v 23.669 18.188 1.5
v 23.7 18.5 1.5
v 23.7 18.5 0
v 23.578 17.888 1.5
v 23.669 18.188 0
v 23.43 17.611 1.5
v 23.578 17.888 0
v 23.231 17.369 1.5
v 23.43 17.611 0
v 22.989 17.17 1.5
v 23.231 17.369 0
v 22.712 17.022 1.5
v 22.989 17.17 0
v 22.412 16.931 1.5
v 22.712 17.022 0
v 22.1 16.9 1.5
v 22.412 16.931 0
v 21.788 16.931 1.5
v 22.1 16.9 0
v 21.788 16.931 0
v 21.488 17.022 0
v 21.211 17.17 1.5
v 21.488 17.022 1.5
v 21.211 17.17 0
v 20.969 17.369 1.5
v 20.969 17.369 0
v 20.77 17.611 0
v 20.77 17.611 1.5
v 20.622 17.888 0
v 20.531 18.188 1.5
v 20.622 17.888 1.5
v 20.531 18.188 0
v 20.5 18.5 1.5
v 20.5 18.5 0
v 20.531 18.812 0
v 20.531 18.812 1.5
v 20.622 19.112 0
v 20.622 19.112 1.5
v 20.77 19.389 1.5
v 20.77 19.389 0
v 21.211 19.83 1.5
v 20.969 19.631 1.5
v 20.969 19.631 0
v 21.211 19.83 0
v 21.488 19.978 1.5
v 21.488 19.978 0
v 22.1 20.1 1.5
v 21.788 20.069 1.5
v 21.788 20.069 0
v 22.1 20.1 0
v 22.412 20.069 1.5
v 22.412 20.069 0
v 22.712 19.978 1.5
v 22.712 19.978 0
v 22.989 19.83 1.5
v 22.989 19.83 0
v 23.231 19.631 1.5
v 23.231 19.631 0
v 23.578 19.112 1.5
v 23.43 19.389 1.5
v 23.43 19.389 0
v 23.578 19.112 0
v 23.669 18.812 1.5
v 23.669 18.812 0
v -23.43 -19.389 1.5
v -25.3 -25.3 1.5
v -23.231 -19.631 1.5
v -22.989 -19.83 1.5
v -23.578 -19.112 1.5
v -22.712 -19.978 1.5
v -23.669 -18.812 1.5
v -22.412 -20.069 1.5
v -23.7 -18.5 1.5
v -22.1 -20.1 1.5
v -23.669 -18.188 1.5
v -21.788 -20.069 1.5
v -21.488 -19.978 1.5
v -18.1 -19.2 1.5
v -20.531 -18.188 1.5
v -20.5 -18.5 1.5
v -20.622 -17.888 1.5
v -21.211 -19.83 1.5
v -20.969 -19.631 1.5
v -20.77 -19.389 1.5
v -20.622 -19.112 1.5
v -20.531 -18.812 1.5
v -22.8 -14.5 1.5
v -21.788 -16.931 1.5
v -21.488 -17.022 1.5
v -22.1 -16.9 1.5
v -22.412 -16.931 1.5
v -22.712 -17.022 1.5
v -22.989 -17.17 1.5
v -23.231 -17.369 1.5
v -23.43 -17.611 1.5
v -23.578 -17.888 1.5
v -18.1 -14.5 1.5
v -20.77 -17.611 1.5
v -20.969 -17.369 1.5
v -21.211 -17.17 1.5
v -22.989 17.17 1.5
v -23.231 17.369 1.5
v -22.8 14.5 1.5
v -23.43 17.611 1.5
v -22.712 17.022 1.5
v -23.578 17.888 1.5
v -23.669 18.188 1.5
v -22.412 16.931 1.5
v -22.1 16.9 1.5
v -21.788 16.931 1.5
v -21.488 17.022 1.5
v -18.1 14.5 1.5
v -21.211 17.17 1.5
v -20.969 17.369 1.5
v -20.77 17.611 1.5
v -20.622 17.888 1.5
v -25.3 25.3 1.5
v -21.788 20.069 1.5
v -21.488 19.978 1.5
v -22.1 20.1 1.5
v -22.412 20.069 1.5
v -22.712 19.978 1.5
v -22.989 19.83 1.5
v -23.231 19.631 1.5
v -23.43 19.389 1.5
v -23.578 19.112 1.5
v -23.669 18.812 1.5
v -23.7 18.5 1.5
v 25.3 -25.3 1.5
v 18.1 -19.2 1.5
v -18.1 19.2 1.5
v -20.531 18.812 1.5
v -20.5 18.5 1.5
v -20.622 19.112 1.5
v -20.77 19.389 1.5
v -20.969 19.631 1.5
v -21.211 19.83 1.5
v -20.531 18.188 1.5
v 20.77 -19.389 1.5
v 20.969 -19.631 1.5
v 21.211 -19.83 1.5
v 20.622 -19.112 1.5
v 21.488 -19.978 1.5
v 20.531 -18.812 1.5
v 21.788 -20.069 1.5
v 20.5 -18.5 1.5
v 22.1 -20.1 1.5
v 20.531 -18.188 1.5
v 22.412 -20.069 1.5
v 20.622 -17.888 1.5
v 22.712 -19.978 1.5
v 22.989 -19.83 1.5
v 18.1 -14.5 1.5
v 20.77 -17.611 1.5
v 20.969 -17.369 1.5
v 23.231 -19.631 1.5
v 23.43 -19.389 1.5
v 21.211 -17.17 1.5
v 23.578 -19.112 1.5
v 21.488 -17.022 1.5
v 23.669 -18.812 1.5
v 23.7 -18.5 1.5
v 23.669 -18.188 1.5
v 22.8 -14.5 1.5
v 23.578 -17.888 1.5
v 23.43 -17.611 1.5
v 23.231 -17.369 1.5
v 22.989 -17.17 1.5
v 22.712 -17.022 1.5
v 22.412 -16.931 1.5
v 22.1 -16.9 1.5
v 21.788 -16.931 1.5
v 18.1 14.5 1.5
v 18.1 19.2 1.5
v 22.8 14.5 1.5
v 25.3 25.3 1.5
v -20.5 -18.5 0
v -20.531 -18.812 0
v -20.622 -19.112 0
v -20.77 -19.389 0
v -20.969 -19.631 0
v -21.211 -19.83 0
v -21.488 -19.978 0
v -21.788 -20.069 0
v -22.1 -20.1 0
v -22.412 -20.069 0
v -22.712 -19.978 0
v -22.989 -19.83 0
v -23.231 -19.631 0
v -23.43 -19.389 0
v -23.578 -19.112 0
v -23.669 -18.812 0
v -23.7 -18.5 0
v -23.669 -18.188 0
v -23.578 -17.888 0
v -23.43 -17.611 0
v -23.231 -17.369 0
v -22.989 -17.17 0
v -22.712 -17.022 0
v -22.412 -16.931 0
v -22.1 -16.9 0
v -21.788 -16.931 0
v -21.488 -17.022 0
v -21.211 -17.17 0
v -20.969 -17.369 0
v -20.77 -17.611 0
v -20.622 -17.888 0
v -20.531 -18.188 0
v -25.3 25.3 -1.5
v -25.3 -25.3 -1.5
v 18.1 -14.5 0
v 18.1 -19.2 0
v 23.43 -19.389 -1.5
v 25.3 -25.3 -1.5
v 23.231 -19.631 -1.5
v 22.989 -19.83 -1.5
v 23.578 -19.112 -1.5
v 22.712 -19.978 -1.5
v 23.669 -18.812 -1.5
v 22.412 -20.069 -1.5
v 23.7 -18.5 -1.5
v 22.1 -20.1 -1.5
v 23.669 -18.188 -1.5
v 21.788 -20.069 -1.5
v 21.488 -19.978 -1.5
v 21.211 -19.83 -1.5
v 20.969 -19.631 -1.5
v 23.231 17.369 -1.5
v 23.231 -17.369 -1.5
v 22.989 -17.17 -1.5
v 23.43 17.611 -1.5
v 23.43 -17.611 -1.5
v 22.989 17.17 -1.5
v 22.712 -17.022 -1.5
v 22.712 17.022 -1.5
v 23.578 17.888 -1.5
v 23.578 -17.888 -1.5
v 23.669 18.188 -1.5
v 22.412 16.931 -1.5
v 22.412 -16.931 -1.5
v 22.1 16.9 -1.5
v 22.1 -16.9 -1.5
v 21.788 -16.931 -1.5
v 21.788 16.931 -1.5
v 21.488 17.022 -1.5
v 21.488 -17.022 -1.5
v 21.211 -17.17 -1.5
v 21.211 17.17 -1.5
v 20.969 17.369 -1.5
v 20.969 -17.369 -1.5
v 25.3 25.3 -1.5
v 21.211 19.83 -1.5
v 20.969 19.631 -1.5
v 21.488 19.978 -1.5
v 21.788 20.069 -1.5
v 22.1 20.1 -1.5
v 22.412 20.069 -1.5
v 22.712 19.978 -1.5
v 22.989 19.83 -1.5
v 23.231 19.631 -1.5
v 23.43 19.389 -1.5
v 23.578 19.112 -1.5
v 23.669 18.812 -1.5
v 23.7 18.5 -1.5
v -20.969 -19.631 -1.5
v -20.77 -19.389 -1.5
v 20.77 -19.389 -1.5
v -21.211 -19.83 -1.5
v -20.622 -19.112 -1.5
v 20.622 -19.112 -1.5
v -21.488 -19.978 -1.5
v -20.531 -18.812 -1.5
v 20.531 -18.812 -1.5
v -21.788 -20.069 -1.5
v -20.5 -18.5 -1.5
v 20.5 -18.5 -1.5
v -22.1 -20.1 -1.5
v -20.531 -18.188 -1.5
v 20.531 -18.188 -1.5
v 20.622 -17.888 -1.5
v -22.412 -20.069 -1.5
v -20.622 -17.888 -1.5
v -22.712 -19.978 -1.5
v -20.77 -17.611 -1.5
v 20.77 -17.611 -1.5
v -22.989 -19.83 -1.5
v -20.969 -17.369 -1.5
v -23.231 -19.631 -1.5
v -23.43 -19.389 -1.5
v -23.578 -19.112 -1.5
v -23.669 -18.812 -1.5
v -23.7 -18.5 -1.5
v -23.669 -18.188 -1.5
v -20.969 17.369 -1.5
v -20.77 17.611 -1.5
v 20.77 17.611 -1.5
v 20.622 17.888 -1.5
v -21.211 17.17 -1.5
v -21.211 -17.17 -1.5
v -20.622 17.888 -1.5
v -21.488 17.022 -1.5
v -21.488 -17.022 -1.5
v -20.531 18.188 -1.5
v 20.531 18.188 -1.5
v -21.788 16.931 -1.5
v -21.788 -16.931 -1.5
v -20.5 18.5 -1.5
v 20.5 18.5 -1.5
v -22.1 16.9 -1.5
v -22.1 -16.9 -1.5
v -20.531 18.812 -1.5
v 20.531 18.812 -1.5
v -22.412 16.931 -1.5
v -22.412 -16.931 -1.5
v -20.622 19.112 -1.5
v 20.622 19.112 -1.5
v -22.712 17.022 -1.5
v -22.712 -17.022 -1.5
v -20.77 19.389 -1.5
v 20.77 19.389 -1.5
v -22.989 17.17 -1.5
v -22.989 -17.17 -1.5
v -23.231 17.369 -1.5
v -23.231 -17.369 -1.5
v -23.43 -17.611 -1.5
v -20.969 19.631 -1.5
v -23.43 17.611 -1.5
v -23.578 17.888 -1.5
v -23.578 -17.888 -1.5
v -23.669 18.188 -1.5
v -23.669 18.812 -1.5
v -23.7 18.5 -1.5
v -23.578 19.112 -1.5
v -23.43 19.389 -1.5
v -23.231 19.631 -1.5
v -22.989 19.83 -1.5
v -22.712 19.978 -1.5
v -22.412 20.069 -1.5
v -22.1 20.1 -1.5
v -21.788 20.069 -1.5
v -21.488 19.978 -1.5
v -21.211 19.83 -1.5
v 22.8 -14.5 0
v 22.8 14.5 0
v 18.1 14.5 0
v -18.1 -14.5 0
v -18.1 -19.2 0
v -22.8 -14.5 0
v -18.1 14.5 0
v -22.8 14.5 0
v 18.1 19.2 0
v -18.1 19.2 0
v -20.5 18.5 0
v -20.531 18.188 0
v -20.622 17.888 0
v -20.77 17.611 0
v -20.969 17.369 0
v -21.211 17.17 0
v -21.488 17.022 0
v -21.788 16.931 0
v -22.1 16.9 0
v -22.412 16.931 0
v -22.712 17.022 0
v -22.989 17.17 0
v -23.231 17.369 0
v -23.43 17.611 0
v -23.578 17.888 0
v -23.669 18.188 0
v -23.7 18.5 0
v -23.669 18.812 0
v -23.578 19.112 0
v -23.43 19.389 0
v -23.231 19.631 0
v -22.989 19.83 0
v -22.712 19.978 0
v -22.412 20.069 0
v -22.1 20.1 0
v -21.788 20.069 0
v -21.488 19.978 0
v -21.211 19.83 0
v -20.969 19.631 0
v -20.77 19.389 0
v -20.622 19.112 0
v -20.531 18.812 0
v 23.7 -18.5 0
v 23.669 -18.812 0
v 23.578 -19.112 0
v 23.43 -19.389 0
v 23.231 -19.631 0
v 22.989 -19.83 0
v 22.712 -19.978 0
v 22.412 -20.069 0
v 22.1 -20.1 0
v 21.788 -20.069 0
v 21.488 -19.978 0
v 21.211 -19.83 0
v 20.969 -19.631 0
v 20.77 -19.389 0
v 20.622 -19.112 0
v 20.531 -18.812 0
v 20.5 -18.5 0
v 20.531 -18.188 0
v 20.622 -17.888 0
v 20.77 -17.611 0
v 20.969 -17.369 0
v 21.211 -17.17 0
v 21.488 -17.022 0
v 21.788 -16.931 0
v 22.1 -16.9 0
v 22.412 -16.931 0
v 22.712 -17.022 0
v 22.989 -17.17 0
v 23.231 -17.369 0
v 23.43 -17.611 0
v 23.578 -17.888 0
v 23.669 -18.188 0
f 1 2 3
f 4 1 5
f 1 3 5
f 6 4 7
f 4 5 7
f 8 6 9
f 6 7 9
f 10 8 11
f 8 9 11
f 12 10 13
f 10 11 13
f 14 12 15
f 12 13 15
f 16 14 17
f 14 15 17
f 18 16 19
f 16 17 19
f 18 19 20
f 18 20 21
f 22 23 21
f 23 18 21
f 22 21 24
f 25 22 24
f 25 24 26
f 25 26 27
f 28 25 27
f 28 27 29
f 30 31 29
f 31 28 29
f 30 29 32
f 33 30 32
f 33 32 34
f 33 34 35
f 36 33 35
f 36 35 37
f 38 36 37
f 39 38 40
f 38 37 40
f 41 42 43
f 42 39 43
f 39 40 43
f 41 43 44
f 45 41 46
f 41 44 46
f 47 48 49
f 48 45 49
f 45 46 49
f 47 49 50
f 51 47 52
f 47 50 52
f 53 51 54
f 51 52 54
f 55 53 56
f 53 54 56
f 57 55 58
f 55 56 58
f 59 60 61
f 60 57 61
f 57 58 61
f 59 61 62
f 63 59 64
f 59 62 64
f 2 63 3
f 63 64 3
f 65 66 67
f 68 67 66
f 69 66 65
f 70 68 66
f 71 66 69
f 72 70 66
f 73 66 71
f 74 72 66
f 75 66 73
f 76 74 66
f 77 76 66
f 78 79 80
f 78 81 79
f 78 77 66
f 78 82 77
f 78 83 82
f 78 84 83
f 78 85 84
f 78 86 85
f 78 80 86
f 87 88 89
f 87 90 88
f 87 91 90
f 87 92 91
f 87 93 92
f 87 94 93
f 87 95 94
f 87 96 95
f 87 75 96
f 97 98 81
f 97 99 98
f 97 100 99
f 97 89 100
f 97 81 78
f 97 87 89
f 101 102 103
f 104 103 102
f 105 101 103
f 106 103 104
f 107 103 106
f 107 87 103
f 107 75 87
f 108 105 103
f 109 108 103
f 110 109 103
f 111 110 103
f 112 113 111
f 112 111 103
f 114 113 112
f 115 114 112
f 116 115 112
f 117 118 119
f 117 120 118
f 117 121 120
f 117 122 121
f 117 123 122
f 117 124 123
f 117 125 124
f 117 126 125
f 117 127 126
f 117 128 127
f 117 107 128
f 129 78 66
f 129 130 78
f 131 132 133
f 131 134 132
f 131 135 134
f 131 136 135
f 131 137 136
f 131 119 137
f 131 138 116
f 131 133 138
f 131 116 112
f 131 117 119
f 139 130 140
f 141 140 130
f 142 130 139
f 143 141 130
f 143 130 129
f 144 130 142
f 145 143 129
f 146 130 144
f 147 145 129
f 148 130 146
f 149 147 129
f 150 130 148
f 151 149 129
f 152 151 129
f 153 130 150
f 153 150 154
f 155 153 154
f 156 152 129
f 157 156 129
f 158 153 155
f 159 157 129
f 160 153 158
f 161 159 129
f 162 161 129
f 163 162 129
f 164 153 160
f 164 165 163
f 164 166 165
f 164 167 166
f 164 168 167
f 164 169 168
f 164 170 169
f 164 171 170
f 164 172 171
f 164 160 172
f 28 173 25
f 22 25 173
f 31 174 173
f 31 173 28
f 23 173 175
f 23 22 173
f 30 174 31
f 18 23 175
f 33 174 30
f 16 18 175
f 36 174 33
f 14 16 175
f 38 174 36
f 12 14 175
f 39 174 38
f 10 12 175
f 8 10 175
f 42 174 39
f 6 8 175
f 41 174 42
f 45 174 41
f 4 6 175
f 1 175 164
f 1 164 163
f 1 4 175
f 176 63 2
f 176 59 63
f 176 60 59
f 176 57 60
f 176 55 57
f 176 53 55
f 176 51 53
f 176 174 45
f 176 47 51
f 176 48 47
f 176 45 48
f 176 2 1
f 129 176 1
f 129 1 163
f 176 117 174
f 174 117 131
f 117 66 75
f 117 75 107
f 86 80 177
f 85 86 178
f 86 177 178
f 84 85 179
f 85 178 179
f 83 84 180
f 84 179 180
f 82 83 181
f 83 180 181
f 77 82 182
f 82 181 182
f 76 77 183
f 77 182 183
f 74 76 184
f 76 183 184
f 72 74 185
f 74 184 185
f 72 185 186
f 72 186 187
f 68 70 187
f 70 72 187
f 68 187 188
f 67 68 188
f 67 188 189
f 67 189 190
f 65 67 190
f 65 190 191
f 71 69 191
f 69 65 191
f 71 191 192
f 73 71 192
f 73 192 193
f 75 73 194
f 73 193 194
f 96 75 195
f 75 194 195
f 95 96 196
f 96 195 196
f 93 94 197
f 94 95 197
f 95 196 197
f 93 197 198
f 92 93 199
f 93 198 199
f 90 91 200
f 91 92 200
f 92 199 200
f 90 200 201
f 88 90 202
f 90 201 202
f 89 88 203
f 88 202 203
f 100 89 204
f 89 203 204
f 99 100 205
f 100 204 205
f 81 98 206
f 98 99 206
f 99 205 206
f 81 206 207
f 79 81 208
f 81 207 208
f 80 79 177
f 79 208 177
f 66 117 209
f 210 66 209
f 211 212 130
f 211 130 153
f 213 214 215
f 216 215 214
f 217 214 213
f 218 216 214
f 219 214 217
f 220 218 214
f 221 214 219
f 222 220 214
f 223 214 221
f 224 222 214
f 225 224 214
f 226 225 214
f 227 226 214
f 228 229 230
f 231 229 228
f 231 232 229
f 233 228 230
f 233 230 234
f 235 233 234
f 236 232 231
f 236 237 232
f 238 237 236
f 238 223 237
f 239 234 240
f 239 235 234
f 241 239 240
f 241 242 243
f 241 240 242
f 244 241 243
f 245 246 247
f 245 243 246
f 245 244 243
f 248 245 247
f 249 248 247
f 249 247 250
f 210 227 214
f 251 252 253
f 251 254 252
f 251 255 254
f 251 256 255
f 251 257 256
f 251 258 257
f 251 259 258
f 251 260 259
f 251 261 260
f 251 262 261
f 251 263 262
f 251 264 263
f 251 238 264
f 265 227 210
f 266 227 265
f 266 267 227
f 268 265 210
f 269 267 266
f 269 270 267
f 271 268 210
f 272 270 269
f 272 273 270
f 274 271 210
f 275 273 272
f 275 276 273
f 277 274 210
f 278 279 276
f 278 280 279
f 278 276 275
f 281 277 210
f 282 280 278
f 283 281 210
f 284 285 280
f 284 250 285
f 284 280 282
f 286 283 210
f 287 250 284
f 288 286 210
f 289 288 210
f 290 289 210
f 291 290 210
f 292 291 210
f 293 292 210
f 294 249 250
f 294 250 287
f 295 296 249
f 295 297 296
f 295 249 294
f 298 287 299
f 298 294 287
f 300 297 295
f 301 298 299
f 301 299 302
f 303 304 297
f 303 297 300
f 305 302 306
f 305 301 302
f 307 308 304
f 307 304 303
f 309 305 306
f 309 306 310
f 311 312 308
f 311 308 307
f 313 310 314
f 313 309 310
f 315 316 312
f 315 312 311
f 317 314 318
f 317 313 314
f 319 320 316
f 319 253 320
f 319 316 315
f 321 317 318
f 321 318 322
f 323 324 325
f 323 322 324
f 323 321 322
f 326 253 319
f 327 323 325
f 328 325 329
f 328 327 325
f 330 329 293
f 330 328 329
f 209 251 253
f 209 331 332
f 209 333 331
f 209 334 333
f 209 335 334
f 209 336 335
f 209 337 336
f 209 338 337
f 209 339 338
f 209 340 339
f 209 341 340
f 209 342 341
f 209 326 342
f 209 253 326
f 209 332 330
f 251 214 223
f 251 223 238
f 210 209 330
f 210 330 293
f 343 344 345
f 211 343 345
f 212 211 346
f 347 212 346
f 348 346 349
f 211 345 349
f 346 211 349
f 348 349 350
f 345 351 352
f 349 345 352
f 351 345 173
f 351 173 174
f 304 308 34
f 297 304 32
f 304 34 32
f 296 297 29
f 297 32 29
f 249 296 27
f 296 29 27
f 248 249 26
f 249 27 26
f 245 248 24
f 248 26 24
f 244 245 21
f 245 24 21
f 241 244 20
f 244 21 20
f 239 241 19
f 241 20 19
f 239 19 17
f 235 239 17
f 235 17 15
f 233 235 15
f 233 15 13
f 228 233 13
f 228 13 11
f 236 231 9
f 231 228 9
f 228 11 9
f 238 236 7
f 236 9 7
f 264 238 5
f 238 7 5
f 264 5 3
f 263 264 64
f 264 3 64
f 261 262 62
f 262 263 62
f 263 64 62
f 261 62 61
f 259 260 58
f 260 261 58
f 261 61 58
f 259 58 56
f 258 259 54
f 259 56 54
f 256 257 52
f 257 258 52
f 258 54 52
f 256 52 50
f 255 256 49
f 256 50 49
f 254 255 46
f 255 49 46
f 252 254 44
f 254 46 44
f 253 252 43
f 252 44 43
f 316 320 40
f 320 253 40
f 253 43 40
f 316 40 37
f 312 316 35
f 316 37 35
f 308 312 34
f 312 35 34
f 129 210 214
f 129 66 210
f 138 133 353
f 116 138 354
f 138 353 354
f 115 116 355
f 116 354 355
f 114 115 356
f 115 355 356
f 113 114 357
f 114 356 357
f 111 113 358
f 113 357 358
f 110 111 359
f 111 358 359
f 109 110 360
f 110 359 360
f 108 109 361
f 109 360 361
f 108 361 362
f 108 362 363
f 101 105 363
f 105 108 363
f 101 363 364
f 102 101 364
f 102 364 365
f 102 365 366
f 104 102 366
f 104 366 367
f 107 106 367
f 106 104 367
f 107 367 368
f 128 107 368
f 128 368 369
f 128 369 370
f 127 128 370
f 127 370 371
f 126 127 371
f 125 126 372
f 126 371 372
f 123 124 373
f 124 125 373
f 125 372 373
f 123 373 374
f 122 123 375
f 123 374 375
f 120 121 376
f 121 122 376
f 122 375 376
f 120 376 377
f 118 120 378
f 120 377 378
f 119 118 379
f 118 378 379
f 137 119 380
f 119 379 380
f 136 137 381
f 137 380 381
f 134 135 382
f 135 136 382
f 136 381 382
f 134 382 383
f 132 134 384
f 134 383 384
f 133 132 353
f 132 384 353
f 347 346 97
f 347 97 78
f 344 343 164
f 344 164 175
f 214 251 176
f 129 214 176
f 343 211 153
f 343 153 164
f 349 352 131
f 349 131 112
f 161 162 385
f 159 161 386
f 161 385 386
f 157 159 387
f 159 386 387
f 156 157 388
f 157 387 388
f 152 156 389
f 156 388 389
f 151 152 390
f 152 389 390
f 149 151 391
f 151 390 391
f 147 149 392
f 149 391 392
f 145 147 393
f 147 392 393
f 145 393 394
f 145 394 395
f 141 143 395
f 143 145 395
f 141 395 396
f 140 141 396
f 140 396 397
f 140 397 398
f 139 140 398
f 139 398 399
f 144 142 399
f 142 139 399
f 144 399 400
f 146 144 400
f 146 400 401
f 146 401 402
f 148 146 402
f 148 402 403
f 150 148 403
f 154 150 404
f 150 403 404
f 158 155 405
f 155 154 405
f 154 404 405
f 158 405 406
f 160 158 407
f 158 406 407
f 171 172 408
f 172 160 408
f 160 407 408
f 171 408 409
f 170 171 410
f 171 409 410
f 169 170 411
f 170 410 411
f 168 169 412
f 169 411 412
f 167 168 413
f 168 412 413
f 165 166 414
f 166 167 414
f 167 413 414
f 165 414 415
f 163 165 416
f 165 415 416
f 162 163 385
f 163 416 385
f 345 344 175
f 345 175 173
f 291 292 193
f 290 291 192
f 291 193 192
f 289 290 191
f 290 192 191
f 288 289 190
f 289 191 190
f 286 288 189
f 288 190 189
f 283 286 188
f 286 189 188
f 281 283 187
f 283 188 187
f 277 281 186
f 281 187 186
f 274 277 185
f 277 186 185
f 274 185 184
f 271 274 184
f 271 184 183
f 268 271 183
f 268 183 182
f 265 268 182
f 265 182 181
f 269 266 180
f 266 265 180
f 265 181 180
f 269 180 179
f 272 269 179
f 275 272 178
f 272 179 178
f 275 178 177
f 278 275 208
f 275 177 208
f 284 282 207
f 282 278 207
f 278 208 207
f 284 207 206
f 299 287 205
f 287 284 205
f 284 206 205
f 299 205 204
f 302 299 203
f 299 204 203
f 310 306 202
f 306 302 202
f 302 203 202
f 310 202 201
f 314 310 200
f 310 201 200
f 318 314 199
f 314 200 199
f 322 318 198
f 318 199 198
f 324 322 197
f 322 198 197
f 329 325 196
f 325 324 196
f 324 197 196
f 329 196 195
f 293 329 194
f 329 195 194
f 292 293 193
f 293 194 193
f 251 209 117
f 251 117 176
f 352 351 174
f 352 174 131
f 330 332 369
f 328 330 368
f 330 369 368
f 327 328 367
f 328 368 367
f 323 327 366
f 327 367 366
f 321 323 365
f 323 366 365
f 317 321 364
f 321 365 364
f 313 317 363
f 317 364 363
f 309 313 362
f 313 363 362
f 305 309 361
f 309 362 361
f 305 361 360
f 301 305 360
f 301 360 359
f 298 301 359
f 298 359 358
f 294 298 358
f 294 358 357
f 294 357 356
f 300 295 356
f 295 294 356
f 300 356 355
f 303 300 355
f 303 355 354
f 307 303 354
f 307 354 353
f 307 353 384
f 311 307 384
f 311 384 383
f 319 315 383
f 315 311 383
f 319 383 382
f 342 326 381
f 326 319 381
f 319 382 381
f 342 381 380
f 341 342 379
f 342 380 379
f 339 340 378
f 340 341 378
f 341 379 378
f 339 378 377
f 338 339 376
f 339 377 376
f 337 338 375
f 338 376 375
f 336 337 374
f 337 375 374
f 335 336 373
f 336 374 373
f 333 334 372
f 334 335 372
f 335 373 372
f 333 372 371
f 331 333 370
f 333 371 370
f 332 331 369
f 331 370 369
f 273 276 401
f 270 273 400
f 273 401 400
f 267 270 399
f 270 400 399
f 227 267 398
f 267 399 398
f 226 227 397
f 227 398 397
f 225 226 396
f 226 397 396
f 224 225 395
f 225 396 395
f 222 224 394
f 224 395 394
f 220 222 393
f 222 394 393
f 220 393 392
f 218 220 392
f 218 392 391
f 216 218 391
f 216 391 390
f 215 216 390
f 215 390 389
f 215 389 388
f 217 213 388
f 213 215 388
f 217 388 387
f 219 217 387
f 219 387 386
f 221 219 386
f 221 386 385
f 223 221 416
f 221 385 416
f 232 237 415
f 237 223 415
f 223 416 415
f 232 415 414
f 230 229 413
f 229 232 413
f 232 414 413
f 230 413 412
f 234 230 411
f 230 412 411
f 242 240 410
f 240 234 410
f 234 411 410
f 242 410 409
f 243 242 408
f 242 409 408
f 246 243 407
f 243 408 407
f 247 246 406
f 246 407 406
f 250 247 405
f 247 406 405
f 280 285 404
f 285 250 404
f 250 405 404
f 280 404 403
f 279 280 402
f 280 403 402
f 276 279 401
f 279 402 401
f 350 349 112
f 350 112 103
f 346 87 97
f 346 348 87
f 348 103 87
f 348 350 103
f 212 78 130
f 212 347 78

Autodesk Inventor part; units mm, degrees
ref_plane "YZ Plane" through (0, 0, 0) normal (1, 0, 0) x (0, 1, 0)
ref_plane "XZ Plane" through (0, 0, 0) normal (0, 1, 0) x (-1, 0, 0)
ref_plane "XY Plane" through (0, 0, 0) normal (0, 0, 1) x (1, 0, 0)
sketch "スケッチ1" plane through (0, 0, 0) normal (0, 0, 1) x (1, 0, 0)
  line L0 (-25.3, 21.7) -> (25.3, 21.7)
  line L1 (25.3, 21.7) -> (25.3, -21.7)
  line L2 (25.3, -21.7) -> (-25.3, -21.7)
  line L3 (-25.3, -21.7) -> (-25.3, 21.7)
  circle A0 centre (-22.1, 18.5) radius 1.6
  circle A1 centre (22.1, 18.5) radius 1.6
  circle A2 centre (22.1, -18.5) radius 1.6
  circle A3 centre (-22.1, -18.5) radius 1.6
  line L4 (-18.1, 19.2) -> (-18.1, 14.5)
  line L5 (-18.1, 14.5) -> (-22.8, 14.5)
  line L6 (-22.8, 14.5) -> (-22.8, -14.5)
  line L7 (-22.8, -14.5) -> (-18.1, -14.5)
  line L8 (-18.1, -14.5) -> (-18.1, -19.2)
  line L9 (-18.1, -19.2) -> (18.1, -19.2)
  line L10 (18.1, -19.2) -> (18.1, -14.5)
  line L11 (18.1, -14.5) -> (22.8, -14.5)
  line L12 (22.8, -14.5) -> (22.8, 14.5)
  line L13 (22.8, 14.5) -> (18.1, 14.5)
  line L14 (18.1, 14.5) -> (18.1, 19.2)
  line L15 (18.1, 19.2) -> (-18.1, 19.2)
  point P0 (0, 0)
  point P1 (0, 21.7)
  point P2 (-25.3, 0)
  dimension "d0" = 50.6
  dimension "d1" = 43.4
  dimension "d2" = 3.2
  dimension "d3" = 44.2
  dimension "d4" = 37
  dimension "d5" = 22.1
  dimension "d6" = 18.5
  dimension "d7" = 2.5
  dimension "d8" = 2.5
  dimension "d9" = 2.5
  dimension "d10" = 2.5
  dimension "d11" = 4
  dimension "d12" = 4
  dimension "d13" = 4
  dimension "d14" = 4
  dimension "d15" = 4
extrude "押し出し1" add sketch "スケッチ1" along normal blind 1.5
sketch "スケッチ2" plane through (0, 0, 0) normal (0, 0, -1) x (-1, 0, 0)
  line L0 (-25.3, 21.7) -> (25.3, 21.7) projected
  line L1 (-25.3, -21.7) -> (-25.3, 21.7) projected
  circle A0 centre (-22.1, 18.5) radius 1.6 projected
  line L2 (25.3, -21.7) -> (-25.3, -21.7) projected
  circle A1 centre (-22.1, -18.5) radius 1.6 projected
  circle A2 centre (22.1, -18.5) radius 1.6 projected
  line L3 (25.3, 21.7) -> (25.3, -21.7) projected
  circle A3 centre (22.1, 18.5) radius 1.6 projected
  point P0 (0, 0)
extrude "押し出し2" add sketch "スケッチ2" along normal blind 1.5
sketch "スケッチ3" plane through (-25.3, 21.7, 1.5) normal (0, 1, 0) x (1, 0, 0)
  line L0 (0, 3) -> (0, 0) projected
  line L1 (50.6, 0) -> (0, 0) projected
  line L2 (50.6, 3) -> (50.6, 0) projected
  line L3 (0, 3) -> (50.6, 3) projected
  point P0 (25.3, 1.5)
extrude "押し出し3" add sketch "スケッチ3" along normal blind 3.6
sketch "スケッチ4" plane through (-25.3, -21.7, 1.5) normal (0, -1, 0) x (1, 0, 0)
  line L0 (50.6, -3) -> (50.6, 0) projected
  line L1 (0, 0) -> (50.6, 0) projected
  line L2 (0, 0) -> (0, -3) projected
  line L3 (50.6, -3) -> (0, -3) projected
  point P0 (25.3, -1.5)
extrude "押し出し4" add sketch "スケッチ4" along normal blind 3.6
equation "\"d5\" = 0.5 * d3"
equation "\"d6\" = 0.5 * d4"
equation "\"d8\" = d7"
equation "\"d9\" = d7"
equation "\"d10\" = d7"
equation "\"d12\" = d11"
equation "\"d13\" = d11"
equation "\"d14\" = d11"
equation "\"d15\" = d11"
properties part number "fan_controller_case_bottom"
